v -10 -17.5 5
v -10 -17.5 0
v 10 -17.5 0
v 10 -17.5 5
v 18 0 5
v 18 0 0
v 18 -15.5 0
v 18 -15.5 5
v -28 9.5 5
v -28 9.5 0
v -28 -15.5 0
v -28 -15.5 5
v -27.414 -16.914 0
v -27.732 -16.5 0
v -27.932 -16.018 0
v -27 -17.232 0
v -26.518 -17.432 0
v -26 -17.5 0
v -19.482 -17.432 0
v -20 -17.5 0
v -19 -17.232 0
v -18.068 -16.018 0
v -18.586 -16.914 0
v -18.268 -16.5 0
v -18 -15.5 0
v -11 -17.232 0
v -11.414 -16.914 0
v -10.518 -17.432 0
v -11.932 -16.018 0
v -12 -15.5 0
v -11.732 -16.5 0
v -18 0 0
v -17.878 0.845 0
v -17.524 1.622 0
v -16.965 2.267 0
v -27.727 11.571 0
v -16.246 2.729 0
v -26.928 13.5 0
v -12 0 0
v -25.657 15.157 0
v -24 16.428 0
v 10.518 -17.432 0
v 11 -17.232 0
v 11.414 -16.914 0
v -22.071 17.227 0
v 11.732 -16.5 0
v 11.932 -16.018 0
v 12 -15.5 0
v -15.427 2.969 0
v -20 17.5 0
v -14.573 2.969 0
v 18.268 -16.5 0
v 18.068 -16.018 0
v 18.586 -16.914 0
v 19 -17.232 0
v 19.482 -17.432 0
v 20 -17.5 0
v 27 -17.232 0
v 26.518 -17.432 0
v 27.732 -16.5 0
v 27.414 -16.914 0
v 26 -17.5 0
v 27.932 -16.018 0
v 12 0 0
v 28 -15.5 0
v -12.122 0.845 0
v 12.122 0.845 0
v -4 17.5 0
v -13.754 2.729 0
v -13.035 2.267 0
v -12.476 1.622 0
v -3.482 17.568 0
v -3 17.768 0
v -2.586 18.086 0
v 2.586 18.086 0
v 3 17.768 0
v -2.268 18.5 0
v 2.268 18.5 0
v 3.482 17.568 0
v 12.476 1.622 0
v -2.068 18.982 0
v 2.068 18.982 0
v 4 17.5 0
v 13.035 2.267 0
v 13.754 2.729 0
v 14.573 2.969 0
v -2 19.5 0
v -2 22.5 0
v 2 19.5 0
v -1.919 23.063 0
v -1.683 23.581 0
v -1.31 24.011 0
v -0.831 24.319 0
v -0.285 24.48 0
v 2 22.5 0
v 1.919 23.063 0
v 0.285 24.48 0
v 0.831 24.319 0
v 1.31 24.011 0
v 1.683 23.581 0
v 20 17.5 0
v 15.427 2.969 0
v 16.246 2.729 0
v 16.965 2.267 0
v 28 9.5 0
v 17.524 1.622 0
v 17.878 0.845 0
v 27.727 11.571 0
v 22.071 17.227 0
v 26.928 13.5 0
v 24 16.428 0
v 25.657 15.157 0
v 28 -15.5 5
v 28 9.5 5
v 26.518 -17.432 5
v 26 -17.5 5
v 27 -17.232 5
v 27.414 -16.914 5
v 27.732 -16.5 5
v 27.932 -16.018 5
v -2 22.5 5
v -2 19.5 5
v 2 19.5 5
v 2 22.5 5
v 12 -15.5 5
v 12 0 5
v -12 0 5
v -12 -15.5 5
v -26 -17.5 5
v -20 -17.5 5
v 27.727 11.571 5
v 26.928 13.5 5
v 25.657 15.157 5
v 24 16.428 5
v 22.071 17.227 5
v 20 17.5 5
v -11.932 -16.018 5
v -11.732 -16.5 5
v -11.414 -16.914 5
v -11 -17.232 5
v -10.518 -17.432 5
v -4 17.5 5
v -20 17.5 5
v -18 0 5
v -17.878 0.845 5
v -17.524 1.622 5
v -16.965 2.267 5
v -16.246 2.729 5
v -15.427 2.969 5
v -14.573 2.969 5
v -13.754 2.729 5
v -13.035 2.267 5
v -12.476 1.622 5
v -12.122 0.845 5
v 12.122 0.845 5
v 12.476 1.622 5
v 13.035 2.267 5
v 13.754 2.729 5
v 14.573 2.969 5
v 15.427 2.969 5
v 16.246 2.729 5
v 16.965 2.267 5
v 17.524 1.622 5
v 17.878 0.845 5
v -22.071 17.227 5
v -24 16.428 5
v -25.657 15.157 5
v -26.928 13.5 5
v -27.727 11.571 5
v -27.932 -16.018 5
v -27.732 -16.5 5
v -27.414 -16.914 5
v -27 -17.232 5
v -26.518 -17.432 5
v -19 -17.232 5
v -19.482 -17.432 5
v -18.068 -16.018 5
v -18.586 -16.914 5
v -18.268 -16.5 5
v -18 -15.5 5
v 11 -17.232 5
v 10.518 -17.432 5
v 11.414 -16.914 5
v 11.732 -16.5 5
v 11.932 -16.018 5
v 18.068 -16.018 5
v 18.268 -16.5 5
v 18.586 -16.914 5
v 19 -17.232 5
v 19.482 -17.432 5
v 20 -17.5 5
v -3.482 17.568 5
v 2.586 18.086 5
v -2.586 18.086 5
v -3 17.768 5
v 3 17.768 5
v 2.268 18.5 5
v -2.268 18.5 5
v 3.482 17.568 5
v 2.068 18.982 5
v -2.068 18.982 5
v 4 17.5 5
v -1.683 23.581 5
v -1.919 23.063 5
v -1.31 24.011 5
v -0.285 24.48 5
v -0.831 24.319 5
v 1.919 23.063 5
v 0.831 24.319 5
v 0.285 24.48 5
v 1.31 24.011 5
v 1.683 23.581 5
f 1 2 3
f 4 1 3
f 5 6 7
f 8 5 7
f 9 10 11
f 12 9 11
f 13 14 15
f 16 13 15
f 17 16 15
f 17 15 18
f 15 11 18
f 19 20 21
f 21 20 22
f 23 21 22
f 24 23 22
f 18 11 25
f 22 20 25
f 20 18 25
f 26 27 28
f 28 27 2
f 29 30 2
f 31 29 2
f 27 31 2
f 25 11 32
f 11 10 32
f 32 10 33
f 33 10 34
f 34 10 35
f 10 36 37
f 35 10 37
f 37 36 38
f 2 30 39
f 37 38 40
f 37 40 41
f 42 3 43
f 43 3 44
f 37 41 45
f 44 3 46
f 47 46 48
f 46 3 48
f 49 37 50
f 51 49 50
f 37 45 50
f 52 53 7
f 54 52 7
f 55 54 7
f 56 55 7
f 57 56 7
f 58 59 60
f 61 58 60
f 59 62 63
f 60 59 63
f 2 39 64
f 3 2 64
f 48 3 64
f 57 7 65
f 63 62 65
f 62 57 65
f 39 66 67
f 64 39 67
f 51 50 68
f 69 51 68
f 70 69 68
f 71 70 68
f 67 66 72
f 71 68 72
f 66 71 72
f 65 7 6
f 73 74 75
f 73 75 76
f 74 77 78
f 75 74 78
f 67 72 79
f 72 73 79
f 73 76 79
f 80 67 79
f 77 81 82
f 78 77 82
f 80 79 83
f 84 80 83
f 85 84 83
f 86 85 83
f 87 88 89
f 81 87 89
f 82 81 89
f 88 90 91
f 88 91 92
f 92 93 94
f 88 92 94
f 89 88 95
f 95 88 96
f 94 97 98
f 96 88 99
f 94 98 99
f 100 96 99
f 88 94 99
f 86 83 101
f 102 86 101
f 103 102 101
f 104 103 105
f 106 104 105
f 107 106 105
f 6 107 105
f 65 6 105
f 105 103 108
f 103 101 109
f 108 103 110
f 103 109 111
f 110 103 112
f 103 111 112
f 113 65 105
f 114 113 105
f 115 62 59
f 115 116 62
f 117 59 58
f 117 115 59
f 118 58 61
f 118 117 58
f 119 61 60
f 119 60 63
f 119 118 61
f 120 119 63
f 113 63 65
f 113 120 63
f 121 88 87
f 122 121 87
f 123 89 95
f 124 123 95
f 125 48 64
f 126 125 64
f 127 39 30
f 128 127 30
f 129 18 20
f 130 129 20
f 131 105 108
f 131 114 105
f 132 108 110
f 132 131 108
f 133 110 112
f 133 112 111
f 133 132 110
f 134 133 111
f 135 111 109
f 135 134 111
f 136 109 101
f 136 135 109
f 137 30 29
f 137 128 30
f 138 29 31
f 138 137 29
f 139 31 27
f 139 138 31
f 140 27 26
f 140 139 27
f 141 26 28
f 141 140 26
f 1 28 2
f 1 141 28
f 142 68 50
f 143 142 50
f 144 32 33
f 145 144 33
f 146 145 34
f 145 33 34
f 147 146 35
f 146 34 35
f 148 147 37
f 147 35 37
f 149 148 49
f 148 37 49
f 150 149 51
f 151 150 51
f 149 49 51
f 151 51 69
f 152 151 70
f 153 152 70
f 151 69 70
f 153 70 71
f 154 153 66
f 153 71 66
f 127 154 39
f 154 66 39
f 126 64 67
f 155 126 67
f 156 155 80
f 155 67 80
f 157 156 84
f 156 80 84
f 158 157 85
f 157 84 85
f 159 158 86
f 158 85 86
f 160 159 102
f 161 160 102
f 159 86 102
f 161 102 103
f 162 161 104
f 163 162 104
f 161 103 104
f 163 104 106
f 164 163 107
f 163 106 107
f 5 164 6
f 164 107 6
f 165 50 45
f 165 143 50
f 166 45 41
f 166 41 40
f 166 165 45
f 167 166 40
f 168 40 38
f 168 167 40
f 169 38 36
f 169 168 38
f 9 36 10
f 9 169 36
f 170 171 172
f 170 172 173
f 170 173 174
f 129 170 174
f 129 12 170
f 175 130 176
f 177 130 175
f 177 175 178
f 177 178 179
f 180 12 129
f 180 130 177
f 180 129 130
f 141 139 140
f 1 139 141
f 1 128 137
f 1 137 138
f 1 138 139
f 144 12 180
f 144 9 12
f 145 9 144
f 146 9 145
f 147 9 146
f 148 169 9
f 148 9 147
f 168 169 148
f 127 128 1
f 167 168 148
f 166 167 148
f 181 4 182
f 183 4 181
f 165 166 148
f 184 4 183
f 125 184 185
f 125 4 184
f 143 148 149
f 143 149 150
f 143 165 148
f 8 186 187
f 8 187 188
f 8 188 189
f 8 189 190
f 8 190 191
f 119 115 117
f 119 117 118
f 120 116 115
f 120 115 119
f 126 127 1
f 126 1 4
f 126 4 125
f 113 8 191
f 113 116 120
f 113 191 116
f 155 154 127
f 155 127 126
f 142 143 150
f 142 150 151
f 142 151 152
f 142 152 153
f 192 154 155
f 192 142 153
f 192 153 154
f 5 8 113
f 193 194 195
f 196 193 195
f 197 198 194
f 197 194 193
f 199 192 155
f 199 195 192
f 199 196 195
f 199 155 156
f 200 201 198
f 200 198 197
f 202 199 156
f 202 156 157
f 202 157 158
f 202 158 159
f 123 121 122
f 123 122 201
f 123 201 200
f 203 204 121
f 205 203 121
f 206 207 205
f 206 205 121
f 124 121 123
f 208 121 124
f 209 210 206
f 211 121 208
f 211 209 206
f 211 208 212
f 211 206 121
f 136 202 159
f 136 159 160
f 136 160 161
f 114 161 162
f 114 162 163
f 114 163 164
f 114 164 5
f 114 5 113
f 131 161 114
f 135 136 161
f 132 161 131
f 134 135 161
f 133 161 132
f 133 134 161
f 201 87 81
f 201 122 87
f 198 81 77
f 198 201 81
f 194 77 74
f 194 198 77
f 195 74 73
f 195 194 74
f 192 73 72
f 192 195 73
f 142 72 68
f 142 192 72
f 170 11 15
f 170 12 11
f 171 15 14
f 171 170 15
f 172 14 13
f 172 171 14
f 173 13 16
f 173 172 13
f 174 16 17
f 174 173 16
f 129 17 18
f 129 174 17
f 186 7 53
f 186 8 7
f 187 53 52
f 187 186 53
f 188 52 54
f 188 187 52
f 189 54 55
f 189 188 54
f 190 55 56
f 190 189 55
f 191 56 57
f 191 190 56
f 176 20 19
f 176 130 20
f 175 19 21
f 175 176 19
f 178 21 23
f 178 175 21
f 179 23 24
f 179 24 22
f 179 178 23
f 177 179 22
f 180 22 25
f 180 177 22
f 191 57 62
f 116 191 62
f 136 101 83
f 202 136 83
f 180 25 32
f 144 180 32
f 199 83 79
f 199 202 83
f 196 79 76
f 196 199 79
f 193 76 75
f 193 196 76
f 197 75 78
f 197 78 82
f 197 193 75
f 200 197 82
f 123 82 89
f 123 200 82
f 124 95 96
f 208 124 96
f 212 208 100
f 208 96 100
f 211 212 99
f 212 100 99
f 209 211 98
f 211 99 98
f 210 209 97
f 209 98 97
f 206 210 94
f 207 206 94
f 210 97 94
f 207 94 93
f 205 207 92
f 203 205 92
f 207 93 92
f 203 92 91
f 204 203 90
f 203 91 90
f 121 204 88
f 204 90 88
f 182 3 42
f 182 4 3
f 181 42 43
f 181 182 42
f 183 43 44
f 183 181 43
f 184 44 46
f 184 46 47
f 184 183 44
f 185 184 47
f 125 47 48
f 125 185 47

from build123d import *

# Parameters (mm, degrees)
SZKIC1_R                    = 2
DODANIE_WYCI_GNI_CIE1_DEPTH = 5
ZAOKR_GLENIE1_R             = 2
ZAOKR_GLENIE2_R             = 8


with BuildPart() as part:
    # Szkic1 → Dodanie-wyciągnięcie1 (new body)
    with BuildSketch(Plane.XY):
        with BuildLine():
            ThreePointArc((12, 0), (15, 3), (18, 0))
            Line((18, 0), (18, -17.5))
            Line((18, -17.5), (28, -17.5))
            Line((28, -17.5), (28, 17.5))
            Line((28, 17.5), (2, 17.5))
            Line((2, 17.5), (-2, 17.5))
            Line((-2, 17.5), (-28, 17.5))
            Line((-28, 17.5), (-28, -17.5))
            Line((-28, -17.5), (-18, -17.5))
            Line((-18, -17.5), (-18, 0))
            ThreePointArc((-18, 0), (-15, 3), (-12, 0))
            Line((-12, 0), (-12, -17.5))
            Line((-12, -17.5), (12, -17.5))
            Line((12, -17.5), (12, 0))
        make_face()
        with BuildLine():
            Line((-2, 17.5), (2, 17.5))
            Line((2, 17.5), (2, 22.5))
            ThreePointArc((2, 22.5), (0, 20.5), (-2, 22.5))
            Line((-2, 22.5), (-2, 17.5))
        make_face()
        with Locations((0, 22.5)):
            Circle(SZKIC1_R)
    extrude(amount=DODANIE_WYCI_GNI_CIE1_DEPTH)

    # Zaokrąglenie1
    zaokr_glenie1_edges = [part.edges().sort_by_distance(p)[0] for p in [
        (12, -17.5, 2.5),
        (-12, -17.5, 2.5),
        (-18, -17.5, 2.5),
        (-28, -17.5, 2.5),
        (-2, 17.5, 2.5),
        (2, 17.5, 2.5),
        (28, -17.5, 2.5),
        (18, -17.5, 2.5),
    ]]
    fillet(zaokr_glenie1_edges, radius=ZAOKR_GLENIE1_R)

    # Zaokrąglenie2
    zaokr_glenie2_edges = [part.edges().sort_by_distance(p)[0] for p in [
        (-28, 17.5, 2.5),
        (28, 17.5, 2.5),
    ]]
    fillet(zaokr_glenie2_edges, radius=ZAOKR_GLENIE2_R)


solid = part.part
